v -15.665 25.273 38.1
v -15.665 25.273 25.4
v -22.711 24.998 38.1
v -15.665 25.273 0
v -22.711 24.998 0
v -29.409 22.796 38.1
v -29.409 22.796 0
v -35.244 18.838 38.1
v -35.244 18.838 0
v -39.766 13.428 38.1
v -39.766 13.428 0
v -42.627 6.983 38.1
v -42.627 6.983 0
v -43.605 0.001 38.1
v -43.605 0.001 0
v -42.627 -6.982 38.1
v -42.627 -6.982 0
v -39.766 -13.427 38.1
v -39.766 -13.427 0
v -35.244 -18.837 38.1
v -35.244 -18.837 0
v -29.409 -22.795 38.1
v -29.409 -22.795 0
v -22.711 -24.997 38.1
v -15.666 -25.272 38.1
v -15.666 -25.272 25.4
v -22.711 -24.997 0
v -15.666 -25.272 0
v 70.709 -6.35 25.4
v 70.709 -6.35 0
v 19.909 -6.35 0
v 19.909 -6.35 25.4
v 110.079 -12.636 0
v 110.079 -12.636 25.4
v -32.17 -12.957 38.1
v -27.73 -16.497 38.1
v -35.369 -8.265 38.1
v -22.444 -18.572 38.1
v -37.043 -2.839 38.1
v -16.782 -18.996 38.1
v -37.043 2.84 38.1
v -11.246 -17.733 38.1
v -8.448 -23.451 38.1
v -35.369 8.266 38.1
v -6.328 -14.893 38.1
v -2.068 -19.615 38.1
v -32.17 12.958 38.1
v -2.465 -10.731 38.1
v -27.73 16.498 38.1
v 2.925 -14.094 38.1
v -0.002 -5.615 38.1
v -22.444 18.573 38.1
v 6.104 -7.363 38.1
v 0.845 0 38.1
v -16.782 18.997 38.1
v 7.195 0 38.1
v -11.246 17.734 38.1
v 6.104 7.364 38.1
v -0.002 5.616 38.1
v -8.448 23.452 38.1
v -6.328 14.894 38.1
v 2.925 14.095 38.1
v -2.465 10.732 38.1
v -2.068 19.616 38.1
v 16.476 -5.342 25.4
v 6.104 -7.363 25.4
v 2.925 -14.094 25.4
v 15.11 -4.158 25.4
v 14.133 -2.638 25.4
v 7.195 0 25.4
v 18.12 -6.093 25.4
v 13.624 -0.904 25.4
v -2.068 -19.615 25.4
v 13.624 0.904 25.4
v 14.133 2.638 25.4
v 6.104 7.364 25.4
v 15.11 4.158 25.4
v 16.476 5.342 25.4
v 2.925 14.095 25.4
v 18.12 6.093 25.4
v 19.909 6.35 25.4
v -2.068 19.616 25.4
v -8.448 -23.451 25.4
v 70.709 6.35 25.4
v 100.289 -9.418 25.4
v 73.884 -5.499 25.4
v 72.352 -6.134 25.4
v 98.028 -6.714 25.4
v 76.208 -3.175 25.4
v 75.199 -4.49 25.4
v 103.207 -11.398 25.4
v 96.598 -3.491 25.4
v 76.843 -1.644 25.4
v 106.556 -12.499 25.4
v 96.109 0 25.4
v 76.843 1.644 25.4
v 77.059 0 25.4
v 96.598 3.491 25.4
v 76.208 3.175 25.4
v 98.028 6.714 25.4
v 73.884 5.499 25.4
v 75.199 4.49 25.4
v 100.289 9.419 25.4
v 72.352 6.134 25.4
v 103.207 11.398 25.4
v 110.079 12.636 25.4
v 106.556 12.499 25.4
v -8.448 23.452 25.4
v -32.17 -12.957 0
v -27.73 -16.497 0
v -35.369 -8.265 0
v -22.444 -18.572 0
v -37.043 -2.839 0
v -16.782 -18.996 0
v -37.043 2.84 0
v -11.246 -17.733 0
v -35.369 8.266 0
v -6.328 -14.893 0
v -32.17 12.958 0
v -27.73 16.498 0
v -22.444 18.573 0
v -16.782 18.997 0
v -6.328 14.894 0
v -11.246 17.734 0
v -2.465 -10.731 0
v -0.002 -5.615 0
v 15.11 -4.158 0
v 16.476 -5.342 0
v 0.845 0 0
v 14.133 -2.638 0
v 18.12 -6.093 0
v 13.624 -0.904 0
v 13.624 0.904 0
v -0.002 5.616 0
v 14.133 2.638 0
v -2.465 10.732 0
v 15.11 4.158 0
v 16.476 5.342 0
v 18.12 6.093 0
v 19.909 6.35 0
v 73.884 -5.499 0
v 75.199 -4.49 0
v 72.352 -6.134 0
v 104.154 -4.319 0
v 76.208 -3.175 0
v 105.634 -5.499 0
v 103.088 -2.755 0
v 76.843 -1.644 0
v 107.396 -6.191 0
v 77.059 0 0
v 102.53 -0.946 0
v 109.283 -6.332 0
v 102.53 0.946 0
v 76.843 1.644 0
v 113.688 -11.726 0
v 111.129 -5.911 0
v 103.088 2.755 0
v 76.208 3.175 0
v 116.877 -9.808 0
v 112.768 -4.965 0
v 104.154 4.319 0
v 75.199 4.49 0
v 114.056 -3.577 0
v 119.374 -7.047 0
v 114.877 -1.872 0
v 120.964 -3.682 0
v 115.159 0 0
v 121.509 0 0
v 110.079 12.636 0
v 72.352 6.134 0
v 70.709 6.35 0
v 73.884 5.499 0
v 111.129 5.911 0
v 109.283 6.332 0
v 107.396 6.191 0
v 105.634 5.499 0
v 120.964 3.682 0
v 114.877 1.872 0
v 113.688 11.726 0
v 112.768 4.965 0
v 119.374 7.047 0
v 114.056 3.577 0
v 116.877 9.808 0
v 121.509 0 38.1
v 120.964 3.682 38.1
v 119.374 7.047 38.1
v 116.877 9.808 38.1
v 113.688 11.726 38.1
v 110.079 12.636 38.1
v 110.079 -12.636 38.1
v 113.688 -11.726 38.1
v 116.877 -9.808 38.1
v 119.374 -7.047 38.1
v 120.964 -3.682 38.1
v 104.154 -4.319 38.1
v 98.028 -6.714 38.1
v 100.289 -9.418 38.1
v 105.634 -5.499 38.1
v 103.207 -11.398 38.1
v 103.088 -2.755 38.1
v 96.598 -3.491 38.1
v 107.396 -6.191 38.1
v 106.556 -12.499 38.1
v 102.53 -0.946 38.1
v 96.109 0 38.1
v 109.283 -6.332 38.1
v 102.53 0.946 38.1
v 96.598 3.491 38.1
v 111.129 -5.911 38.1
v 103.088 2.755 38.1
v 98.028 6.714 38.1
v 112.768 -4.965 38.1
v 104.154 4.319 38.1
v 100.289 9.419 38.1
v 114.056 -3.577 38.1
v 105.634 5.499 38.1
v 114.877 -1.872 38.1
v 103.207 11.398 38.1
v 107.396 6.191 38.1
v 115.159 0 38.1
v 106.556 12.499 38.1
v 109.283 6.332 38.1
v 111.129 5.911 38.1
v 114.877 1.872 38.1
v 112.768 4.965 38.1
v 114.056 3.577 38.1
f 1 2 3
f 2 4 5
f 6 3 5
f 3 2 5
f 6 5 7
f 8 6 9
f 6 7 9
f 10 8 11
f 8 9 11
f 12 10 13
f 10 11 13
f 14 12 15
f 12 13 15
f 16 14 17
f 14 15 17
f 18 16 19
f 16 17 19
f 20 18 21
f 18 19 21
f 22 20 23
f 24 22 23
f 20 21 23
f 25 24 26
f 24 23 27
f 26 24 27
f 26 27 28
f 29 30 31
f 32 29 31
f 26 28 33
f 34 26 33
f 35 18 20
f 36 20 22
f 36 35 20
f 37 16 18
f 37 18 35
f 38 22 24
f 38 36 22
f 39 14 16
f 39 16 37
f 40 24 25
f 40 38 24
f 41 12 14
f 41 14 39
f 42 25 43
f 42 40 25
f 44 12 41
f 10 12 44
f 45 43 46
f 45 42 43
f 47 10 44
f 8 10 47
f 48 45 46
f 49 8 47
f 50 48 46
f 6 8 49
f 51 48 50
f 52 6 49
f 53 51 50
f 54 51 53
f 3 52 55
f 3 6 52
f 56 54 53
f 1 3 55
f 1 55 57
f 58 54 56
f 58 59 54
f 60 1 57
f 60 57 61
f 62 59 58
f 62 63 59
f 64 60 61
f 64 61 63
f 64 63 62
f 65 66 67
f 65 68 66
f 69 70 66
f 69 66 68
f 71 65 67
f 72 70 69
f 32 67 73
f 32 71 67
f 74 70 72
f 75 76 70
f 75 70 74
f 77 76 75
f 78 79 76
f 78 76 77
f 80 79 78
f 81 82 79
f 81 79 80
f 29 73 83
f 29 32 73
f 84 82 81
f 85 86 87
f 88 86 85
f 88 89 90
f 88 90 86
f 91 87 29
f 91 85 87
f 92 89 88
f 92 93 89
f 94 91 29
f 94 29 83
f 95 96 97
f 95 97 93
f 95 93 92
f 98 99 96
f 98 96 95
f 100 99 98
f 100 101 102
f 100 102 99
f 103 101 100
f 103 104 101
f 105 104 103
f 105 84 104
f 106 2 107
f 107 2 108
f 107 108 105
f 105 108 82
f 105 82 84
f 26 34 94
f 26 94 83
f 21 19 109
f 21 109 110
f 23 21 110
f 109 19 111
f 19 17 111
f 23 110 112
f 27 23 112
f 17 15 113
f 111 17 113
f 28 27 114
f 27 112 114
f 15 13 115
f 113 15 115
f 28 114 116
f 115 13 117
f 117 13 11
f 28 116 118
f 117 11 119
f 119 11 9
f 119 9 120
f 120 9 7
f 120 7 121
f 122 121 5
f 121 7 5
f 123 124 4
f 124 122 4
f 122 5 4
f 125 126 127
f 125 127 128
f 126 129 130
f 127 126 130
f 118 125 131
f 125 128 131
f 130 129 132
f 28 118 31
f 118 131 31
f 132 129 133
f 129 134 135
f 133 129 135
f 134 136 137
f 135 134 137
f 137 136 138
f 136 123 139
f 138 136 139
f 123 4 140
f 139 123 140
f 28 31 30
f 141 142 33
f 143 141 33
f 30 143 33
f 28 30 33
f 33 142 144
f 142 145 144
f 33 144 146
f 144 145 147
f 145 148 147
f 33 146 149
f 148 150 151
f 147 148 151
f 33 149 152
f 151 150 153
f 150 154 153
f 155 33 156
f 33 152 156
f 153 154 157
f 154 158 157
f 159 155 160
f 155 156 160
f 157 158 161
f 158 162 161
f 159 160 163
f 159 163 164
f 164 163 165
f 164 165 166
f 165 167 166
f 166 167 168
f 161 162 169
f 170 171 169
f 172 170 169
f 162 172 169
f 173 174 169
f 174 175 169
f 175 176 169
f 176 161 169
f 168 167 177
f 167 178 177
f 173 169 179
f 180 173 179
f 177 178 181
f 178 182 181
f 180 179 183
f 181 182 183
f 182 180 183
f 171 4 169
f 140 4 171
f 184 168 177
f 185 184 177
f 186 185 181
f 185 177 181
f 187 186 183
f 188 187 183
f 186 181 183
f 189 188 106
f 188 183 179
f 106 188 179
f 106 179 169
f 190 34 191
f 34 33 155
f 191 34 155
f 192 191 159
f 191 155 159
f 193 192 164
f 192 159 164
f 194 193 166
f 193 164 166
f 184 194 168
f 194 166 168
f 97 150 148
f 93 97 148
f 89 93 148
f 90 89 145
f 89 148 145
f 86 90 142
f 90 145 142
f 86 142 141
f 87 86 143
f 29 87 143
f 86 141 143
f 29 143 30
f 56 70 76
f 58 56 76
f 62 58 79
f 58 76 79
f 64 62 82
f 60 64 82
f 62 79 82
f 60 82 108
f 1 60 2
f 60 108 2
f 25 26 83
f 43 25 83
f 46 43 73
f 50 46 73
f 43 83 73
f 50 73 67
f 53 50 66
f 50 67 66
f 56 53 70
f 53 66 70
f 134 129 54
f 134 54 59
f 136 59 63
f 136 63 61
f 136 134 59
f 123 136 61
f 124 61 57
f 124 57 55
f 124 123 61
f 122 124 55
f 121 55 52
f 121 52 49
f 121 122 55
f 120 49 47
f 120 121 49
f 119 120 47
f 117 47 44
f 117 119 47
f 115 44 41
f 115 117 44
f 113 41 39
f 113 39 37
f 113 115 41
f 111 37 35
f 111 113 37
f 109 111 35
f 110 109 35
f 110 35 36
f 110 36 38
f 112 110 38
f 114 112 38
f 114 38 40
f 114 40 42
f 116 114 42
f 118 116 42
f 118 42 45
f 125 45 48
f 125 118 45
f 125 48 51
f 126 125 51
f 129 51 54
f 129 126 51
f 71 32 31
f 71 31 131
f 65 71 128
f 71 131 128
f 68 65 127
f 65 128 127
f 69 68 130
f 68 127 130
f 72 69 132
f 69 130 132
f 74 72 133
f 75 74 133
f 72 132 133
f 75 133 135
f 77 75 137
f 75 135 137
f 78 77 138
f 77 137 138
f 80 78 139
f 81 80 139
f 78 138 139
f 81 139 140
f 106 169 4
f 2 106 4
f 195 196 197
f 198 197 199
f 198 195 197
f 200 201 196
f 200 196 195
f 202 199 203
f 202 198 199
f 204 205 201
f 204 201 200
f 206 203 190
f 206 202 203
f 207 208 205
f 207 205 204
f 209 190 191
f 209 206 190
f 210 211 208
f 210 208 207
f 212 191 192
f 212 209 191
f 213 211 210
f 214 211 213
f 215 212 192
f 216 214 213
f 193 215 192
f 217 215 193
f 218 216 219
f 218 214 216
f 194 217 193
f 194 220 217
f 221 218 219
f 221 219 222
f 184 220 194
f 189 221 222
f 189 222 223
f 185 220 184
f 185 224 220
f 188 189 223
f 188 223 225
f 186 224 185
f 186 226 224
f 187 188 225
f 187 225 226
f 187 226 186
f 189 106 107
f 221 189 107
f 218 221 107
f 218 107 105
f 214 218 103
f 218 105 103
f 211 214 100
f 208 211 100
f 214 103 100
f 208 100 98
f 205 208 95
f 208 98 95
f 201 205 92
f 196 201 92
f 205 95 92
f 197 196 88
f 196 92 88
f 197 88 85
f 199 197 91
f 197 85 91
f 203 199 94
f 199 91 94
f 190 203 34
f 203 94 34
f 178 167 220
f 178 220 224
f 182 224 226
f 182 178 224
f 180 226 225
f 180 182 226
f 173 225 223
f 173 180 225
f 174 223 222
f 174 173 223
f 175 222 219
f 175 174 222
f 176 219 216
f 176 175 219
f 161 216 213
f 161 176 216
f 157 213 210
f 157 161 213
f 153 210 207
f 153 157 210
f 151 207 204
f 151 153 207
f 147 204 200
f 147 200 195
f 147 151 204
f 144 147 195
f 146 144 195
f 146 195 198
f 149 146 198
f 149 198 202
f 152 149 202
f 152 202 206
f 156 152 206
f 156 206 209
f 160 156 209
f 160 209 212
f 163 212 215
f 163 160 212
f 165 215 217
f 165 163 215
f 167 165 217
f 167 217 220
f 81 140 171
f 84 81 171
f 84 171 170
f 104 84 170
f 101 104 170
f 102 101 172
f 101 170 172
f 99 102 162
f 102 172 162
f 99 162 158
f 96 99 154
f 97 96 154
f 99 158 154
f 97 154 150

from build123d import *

# Parameters (mm, degrees)
F1_DEPTH = 25.4
F0_R     = 19.05
F0_R_2   = 6.35
F2_DEPTH = 38.1


with BuildPart() as f1:
    # F0 (on Top) → F1 (new body)
    with BuildSketch(Plane.XY):
        with BuildLine():
            ThreePointArc((110.078714, -12.636359), (96.108901, 4.5e-05), (110.078804, 12.63635))
            Line((110.078804, 12.63635), (-15.665499, 25.273153))
            ThreePointArc((-15.665499, 25.273153), (0.631774, 17.039363), (7.194695, 0.000453))
            ThreePointArc((7.194695, 0.000453), (0.631713, -17.038525), (-15.665679, -25.272266))
            Line((-15.665679, -25.272266), (110.078714, -12.636359))
        make_face()
        with BuildLine():
            ThreePointArc((70.708901, 6.35), (75.199029, 4.490128), (77.058901, 0))
            ThreePointArc((77.058901, 0), (75.199029, -4.490128), (70.708901, -6.35))
            Line((70.708901, -6.35), (19.908901, -6.35))
            ThreePointArc((19.908901, -6.35), (13.558901, 0), (19.908901, 6.35))
            Line((19.908901, 6.35), (70.708901, 6.35))
        make_face(mode=Mode.SUBTRACT)
    extrude(amount=F1_DEPTH)

    # F0 (on Top) → F2 (join)
    with BuildSketch(Plane.XY):
        with BuildLine():
            ThreePointArc((7.194695, 0.000453), (0.631774, 17.039363), (-15.665499, 25.273153))
            ThreePointArc((-15.665499, 25.273153), (-43.605305, 0.000543), (-15.665679, -25.272266))
            ThreePointArc((-15.665679, -25.272266), (0.631713, -17.038525), (7.194695, 0.000453))
        make_face()
        with Locations((-18.205305, 0.000453)):
            Circle(F0_R, mode=Mode.SUBTRACT)
        with BuildLine():
            ThreePointArc((110.078714, -12.636359), (118.22741, -8.519489), (121.508901, 0))
            ThreePointArc((121.508901, 0), (118.22744, 8.519455), (110.078804, 12.63635))
            ThreePointArc((110.078804, 12.63635), (96.108901, 4.5e-05), (110.078714, -12.636359))
        make_face()
        with Locations((108.808901, 0)):
            Circle(F0_R_2, mode=Mode.SUBTRACT)
    extrude(amount=F2_DEPTH)


solid = f1.part
